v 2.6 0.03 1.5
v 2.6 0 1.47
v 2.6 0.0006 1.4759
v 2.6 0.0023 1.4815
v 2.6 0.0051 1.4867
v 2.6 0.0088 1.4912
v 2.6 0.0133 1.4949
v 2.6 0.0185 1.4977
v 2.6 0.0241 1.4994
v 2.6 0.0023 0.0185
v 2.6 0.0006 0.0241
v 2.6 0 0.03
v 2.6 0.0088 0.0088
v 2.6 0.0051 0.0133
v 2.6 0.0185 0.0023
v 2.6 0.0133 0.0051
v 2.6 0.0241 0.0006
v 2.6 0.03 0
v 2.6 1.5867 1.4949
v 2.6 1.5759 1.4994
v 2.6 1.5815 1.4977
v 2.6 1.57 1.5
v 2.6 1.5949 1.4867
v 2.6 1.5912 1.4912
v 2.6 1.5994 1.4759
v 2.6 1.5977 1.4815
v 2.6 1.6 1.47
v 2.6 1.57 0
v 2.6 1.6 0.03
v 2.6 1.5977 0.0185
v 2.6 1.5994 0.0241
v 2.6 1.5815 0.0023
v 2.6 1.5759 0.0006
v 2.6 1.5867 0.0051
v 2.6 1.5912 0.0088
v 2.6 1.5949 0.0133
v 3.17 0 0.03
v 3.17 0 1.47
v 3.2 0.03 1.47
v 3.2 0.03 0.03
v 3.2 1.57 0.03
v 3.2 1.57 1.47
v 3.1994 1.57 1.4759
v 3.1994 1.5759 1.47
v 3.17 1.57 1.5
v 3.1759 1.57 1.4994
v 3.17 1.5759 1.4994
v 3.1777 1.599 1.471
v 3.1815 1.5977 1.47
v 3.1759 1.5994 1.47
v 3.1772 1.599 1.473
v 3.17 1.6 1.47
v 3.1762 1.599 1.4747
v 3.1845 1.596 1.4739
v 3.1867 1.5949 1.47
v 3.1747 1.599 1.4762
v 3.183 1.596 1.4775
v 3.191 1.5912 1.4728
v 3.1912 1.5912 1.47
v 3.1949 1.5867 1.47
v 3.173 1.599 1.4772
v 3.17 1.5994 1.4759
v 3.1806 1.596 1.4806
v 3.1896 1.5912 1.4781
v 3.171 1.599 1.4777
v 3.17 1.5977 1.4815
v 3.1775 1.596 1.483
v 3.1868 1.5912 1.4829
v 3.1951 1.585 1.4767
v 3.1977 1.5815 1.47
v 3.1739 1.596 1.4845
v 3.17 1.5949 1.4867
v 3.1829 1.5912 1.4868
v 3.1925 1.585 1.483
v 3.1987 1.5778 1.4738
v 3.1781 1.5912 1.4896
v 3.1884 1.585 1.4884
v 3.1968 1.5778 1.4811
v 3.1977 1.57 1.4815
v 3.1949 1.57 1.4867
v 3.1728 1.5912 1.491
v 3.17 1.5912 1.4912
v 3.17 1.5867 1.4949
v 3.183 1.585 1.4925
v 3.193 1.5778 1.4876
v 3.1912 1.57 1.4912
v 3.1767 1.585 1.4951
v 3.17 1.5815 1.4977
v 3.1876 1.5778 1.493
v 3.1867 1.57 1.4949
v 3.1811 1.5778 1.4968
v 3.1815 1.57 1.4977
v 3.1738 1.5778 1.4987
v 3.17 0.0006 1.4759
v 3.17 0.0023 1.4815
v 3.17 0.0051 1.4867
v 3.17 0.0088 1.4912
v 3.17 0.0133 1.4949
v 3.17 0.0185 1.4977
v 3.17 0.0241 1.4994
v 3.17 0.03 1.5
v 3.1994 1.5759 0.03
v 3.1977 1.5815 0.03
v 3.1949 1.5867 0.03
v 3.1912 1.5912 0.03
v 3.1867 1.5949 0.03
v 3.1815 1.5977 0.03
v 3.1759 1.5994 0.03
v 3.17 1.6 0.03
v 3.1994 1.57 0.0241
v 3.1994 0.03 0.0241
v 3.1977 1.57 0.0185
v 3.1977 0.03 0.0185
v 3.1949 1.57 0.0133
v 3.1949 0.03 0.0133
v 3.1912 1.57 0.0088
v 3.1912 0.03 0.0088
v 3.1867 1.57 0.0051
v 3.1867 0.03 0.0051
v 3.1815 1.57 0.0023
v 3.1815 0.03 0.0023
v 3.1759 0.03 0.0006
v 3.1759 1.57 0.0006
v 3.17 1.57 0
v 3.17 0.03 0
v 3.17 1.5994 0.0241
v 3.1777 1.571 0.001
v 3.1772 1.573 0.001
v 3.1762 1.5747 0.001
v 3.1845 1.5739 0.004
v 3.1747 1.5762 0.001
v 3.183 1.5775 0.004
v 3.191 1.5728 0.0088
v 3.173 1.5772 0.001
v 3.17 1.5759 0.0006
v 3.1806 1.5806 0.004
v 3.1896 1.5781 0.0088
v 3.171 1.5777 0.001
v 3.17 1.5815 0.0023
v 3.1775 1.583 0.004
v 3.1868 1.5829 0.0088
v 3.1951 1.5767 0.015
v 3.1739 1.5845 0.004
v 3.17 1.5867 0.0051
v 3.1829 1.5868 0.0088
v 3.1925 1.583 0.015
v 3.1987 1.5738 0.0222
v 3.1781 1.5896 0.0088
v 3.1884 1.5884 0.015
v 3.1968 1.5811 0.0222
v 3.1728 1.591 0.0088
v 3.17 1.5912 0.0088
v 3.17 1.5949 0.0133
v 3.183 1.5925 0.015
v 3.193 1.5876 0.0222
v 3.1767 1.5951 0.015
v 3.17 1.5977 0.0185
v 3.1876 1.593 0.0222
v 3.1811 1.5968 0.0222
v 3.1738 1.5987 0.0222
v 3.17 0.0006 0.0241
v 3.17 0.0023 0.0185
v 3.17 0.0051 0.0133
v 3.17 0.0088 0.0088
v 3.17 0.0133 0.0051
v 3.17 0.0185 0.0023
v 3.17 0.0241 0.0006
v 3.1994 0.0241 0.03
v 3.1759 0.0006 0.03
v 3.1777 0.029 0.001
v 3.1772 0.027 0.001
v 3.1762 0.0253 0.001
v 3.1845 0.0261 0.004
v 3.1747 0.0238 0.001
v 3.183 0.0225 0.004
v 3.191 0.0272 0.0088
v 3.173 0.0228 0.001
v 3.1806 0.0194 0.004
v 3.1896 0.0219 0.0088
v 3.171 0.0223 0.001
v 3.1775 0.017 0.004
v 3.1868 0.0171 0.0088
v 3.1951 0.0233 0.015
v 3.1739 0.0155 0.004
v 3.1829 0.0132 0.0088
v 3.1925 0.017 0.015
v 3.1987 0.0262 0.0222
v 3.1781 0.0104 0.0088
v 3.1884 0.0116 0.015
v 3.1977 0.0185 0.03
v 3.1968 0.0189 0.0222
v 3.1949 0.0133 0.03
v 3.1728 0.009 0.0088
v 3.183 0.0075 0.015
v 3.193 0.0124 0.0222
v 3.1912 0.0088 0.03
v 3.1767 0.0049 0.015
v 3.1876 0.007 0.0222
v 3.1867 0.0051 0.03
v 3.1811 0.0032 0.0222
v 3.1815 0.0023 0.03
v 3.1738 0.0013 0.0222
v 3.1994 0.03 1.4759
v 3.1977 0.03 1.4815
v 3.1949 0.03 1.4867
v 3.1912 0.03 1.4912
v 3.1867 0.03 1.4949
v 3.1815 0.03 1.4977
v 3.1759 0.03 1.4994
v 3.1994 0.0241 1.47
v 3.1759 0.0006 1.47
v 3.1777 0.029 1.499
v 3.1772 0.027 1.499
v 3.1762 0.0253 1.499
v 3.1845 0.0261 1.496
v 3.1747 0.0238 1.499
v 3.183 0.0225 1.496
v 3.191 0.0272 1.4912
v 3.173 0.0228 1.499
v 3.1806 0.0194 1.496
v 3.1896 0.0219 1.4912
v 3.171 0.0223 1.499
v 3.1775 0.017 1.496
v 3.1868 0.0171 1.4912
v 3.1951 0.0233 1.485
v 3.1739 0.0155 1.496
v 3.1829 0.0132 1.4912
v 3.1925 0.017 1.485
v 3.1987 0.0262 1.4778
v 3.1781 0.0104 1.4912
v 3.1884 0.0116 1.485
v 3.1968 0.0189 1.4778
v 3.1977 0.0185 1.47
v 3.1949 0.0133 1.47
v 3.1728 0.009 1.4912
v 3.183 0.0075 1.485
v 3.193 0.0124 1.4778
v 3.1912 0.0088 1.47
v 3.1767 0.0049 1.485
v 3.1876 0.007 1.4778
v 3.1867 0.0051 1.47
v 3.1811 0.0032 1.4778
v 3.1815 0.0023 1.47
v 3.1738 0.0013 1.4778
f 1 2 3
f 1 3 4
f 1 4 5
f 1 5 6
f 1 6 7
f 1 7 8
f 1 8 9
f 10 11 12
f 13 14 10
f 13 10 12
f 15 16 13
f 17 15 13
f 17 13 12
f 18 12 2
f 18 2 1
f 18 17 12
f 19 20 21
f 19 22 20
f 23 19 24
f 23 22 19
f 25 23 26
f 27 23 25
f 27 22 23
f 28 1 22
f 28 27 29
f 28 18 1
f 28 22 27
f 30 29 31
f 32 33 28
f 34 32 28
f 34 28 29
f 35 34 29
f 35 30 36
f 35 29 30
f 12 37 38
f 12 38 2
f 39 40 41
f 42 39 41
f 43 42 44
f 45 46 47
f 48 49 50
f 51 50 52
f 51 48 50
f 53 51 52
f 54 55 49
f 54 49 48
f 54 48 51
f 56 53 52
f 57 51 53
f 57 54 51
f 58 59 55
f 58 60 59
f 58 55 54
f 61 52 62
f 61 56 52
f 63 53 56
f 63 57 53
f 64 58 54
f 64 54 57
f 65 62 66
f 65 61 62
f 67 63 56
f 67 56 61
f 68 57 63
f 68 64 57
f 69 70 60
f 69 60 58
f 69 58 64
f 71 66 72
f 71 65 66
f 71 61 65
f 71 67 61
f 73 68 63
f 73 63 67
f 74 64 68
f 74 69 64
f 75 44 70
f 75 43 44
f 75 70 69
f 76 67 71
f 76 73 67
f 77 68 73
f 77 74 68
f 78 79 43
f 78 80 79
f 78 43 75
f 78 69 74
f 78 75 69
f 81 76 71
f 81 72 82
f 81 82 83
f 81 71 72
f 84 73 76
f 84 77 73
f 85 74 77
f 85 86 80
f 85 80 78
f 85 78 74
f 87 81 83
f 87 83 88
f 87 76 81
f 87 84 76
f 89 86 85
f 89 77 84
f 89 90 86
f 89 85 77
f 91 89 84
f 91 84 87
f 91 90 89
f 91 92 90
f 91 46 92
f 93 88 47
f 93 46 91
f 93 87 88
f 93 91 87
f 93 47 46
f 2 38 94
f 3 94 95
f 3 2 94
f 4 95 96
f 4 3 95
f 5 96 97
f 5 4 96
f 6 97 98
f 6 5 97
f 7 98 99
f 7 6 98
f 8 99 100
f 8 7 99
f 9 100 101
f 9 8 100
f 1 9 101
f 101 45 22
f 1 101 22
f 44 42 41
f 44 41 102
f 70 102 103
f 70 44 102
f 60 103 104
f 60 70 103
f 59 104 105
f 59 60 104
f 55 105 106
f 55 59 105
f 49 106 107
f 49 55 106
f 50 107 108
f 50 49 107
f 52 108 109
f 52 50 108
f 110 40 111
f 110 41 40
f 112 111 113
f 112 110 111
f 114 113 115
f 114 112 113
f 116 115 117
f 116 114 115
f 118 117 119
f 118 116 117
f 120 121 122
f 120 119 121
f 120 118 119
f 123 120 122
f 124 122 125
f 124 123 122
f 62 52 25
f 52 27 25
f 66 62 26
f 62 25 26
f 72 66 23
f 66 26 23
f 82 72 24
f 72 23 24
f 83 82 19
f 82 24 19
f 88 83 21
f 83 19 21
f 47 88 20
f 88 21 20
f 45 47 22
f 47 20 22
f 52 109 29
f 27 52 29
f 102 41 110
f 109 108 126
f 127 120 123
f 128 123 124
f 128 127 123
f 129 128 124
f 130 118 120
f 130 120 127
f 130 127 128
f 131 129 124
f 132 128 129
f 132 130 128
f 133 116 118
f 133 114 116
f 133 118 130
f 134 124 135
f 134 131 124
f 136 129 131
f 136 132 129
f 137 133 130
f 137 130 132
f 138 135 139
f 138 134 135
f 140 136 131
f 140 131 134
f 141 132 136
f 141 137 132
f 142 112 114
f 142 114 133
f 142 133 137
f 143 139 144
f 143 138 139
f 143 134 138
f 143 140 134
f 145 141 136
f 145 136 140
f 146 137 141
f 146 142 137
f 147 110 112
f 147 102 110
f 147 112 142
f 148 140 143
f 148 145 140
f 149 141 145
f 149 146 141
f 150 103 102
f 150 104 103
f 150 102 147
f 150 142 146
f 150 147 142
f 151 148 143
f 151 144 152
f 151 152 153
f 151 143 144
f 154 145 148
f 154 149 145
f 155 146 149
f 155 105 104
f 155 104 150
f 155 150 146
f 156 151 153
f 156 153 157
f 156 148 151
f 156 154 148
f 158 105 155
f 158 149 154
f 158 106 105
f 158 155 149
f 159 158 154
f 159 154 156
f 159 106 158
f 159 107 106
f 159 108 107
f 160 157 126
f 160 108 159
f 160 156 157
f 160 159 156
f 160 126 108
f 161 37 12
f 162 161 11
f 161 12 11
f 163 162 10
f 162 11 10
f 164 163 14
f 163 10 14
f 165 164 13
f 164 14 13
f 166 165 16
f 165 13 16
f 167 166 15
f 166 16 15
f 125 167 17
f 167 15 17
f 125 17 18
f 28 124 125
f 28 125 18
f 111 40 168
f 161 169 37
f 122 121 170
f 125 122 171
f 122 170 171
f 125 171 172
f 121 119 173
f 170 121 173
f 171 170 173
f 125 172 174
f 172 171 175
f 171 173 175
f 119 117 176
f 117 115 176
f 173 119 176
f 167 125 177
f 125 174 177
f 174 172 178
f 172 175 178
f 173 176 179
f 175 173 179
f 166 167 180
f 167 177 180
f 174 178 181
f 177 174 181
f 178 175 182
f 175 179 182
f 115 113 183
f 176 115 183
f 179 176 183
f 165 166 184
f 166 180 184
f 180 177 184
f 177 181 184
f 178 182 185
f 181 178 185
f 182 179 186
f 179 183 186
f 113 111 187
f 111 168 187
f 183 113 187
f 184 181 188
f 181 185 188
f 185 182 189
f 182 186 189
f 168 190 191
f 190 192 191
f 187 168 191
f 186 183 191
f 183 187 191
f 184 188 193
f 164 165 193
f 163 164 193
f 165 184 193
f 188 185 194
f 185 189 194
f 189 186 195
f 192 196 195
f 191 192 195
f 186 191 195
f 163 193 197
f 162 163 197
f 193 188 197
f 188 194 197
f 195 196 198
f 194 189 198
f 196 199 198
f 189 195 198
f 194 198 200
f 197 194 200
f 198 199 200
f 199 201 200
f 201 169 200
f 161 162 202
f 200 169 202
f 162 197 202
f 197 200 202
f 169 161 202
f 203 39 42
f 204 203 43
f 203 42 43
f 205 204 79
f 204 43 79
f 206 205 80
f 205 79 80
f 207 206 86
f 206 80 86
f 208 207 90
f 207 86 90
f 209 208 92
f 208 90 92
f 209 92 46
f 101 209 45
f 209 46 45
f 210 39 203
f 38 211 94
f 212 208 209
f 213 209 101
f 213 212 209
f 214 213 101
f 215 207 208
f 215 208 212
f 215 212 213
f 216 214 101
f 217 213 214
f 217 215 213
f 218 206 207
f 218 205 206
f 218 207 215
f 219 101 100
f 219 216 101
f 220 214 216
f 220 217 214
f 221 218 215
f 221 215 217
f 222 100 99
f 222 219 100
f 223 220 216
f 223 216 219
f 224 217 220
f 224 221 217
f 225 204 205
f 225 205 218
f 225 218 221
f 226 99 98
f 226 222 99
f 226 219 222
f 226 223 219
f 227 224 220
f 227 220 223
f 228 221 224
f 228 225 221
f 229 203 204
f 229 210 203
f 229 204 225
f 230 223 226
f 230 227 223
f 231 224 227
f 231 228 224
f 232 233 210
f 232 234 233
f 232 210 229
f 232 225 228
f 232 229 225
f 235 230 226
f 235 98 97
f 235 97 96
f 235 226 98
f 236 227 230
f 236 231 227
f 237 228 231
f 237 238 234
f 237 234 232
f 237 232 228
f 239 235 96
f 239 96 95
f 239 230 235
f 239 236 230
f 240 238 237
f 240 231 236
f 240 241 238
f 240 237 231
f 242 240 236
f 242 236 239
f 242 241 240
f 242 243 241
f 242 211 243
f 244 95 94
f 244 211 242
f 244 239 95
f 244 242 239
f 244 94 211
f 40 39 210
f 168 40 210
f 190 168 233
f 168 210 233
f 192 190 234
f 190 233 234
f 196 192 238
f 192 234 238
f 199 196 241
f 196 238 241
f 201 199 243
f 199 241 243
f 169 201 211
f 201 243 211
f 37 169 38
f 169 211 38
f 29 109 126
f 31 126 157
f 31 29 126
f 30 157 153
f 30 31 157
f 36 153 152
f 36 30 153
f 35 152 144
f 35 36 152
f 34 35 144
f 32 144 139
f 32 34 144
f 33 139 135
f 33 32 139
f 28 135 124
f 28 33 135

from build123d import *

# Parameters (mm, degrees)
BOX021_W     = 0.6
BOX021_H     = 1.6
BOX021_DEPTH = 1.5
FILLET027_R  = 0.03


with BuildPart() as fillet027:
    # Box021 → Box021 (new body)
    with BuildSketch(Plane.XY):
        with Locations((0.3, 0.8)):
            Rectangle(BOX021_W, BOX021_H)
    extrude(amount=BOX021_DEPTH)

    # Fillet027
    fillet027_edges = [fillet027.edges().sort_by_distance(p)[0] for p in [
        (0, 0, 0.75),
        (0, 0.8, 1.5),
        (0, 1.6, 0.75),
        (0, 0.8, 0),
        (0.3, 0, 0),
        (0.3, 0, 1.5),
        (0.3, 1.6, 0),
        (0.3, 1.6, 1.5),
    ]]
    fillet(fillet027_edges, radius=FILLET027_R)


with BuildPart() as part_mirroring019:
    # Part__Mirroring019: instance of Fillet027
    add(fillet027.part.mirror(Plane(origin=(1.6, 0, 0), x_dir=(0, -1, 0), z_dir=(1, 0, 0))))


solid = part_mirroring019.part
